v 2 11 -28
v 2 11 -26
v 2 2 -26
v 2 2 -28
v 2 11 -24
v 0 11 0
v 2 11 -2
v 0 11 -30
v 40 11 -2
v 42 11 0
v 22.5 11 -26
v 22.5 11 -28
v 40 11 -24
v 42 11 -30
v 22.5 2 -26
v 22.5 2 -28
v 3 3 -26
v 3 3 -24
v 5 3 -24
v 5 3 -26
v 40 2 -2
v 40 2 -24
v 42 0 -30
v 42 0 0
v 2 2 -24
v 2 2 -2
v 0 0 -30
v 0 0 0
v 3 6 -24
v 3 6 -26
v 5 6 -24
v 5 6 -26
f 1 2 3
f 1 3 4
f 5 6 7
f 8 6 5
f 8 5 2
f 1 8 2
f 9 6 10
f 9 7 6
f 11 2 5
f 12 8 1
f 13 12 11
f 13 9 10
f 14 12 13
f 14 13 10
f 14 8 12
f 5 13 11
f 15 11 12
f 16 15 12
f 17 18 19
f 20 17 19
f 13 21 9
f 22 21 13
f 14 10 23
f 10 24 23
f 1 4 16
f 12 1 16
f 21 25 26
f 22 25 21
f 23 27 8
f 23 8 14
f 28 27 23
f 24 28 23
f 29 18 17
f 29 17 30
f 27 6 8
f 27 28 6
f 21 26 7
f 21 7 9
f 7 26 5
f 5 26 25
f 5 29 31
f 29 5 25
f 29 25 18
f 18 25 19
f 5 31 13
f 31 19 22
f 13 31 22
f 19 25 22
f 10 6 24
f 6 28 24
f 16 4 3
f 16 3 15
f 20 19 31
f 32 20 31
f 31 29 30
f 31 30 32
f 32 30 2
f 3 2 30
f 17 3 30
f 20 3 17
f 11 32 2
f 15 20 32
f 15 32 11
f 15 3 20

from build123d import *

# Parameters (mm, degrees)
SKETCH1_W           = 42
SKETCH1_H           = 30
BOSS_EXTRUDE1_DEPTH = 2
SKETCH2_W           = 42
SKETCH2_H           = 30
SKETCH2_W_2         = 20.5
SKETCH2_H_2         = 2
SKETCH2_W_3         = 38
SKETCH2_H_3         = 22
BOSS_EXTRUDE2_DEPTH = 9
SKETCH6_W           = 2
SKETCH6_H           = 3
CUT_EXTRUDE2_DEPTH  = 2


with BuildPart() as part:
    # Sketch1 → Boss-Extrude1 (new body)
    with BuildSketch(Plane(origin=(0, 0, 0), x_dir=(1, 0, 0), z_dir=(0, 1, 0))):
        with Locations((21, 15)):
            Rectangle(SKETCH1_W, SKETCH1_H)
    extrude(amount=BOSS_EXTRUDE1_DEPTH)

    # Sketch2 → Boss-Extrude2 (add)
    with BuildSketch(Plane(origin=(0, 2, 0), x_dir=(1, 0, 0), z_dir=(0, 1, 0))):
        with Locations((21, 15)):
            Rectangle(SKETCH2_W, SKETCH2_H)
        with Locations((12.25, 27)):
            Rectangle(SKETCH2_W_2, SKETCH2_H_2, mode=Mode.SUBTRACT)
        with Locations((21, 13)):
            Rectangle(SKETCH2_W_3, SKETCH2_H_3, mode=Mode.SUBTRACT)
    extrude(amount=BOSS_EXTRUDE2_DEPTH)

    # Sketch6 → Cut-Extrude2 (cut)
    with BuildSketch(Plane.XY.offset(-24)):
        with Locations((4, 4.5)):
            Rectangle(SKETCH6_W, SKETCH6_H)
    extrude(amount=-CUT_EXTRUDE2_DEPTH, mode=Mode.SUBTRACT)


solid = part.part
